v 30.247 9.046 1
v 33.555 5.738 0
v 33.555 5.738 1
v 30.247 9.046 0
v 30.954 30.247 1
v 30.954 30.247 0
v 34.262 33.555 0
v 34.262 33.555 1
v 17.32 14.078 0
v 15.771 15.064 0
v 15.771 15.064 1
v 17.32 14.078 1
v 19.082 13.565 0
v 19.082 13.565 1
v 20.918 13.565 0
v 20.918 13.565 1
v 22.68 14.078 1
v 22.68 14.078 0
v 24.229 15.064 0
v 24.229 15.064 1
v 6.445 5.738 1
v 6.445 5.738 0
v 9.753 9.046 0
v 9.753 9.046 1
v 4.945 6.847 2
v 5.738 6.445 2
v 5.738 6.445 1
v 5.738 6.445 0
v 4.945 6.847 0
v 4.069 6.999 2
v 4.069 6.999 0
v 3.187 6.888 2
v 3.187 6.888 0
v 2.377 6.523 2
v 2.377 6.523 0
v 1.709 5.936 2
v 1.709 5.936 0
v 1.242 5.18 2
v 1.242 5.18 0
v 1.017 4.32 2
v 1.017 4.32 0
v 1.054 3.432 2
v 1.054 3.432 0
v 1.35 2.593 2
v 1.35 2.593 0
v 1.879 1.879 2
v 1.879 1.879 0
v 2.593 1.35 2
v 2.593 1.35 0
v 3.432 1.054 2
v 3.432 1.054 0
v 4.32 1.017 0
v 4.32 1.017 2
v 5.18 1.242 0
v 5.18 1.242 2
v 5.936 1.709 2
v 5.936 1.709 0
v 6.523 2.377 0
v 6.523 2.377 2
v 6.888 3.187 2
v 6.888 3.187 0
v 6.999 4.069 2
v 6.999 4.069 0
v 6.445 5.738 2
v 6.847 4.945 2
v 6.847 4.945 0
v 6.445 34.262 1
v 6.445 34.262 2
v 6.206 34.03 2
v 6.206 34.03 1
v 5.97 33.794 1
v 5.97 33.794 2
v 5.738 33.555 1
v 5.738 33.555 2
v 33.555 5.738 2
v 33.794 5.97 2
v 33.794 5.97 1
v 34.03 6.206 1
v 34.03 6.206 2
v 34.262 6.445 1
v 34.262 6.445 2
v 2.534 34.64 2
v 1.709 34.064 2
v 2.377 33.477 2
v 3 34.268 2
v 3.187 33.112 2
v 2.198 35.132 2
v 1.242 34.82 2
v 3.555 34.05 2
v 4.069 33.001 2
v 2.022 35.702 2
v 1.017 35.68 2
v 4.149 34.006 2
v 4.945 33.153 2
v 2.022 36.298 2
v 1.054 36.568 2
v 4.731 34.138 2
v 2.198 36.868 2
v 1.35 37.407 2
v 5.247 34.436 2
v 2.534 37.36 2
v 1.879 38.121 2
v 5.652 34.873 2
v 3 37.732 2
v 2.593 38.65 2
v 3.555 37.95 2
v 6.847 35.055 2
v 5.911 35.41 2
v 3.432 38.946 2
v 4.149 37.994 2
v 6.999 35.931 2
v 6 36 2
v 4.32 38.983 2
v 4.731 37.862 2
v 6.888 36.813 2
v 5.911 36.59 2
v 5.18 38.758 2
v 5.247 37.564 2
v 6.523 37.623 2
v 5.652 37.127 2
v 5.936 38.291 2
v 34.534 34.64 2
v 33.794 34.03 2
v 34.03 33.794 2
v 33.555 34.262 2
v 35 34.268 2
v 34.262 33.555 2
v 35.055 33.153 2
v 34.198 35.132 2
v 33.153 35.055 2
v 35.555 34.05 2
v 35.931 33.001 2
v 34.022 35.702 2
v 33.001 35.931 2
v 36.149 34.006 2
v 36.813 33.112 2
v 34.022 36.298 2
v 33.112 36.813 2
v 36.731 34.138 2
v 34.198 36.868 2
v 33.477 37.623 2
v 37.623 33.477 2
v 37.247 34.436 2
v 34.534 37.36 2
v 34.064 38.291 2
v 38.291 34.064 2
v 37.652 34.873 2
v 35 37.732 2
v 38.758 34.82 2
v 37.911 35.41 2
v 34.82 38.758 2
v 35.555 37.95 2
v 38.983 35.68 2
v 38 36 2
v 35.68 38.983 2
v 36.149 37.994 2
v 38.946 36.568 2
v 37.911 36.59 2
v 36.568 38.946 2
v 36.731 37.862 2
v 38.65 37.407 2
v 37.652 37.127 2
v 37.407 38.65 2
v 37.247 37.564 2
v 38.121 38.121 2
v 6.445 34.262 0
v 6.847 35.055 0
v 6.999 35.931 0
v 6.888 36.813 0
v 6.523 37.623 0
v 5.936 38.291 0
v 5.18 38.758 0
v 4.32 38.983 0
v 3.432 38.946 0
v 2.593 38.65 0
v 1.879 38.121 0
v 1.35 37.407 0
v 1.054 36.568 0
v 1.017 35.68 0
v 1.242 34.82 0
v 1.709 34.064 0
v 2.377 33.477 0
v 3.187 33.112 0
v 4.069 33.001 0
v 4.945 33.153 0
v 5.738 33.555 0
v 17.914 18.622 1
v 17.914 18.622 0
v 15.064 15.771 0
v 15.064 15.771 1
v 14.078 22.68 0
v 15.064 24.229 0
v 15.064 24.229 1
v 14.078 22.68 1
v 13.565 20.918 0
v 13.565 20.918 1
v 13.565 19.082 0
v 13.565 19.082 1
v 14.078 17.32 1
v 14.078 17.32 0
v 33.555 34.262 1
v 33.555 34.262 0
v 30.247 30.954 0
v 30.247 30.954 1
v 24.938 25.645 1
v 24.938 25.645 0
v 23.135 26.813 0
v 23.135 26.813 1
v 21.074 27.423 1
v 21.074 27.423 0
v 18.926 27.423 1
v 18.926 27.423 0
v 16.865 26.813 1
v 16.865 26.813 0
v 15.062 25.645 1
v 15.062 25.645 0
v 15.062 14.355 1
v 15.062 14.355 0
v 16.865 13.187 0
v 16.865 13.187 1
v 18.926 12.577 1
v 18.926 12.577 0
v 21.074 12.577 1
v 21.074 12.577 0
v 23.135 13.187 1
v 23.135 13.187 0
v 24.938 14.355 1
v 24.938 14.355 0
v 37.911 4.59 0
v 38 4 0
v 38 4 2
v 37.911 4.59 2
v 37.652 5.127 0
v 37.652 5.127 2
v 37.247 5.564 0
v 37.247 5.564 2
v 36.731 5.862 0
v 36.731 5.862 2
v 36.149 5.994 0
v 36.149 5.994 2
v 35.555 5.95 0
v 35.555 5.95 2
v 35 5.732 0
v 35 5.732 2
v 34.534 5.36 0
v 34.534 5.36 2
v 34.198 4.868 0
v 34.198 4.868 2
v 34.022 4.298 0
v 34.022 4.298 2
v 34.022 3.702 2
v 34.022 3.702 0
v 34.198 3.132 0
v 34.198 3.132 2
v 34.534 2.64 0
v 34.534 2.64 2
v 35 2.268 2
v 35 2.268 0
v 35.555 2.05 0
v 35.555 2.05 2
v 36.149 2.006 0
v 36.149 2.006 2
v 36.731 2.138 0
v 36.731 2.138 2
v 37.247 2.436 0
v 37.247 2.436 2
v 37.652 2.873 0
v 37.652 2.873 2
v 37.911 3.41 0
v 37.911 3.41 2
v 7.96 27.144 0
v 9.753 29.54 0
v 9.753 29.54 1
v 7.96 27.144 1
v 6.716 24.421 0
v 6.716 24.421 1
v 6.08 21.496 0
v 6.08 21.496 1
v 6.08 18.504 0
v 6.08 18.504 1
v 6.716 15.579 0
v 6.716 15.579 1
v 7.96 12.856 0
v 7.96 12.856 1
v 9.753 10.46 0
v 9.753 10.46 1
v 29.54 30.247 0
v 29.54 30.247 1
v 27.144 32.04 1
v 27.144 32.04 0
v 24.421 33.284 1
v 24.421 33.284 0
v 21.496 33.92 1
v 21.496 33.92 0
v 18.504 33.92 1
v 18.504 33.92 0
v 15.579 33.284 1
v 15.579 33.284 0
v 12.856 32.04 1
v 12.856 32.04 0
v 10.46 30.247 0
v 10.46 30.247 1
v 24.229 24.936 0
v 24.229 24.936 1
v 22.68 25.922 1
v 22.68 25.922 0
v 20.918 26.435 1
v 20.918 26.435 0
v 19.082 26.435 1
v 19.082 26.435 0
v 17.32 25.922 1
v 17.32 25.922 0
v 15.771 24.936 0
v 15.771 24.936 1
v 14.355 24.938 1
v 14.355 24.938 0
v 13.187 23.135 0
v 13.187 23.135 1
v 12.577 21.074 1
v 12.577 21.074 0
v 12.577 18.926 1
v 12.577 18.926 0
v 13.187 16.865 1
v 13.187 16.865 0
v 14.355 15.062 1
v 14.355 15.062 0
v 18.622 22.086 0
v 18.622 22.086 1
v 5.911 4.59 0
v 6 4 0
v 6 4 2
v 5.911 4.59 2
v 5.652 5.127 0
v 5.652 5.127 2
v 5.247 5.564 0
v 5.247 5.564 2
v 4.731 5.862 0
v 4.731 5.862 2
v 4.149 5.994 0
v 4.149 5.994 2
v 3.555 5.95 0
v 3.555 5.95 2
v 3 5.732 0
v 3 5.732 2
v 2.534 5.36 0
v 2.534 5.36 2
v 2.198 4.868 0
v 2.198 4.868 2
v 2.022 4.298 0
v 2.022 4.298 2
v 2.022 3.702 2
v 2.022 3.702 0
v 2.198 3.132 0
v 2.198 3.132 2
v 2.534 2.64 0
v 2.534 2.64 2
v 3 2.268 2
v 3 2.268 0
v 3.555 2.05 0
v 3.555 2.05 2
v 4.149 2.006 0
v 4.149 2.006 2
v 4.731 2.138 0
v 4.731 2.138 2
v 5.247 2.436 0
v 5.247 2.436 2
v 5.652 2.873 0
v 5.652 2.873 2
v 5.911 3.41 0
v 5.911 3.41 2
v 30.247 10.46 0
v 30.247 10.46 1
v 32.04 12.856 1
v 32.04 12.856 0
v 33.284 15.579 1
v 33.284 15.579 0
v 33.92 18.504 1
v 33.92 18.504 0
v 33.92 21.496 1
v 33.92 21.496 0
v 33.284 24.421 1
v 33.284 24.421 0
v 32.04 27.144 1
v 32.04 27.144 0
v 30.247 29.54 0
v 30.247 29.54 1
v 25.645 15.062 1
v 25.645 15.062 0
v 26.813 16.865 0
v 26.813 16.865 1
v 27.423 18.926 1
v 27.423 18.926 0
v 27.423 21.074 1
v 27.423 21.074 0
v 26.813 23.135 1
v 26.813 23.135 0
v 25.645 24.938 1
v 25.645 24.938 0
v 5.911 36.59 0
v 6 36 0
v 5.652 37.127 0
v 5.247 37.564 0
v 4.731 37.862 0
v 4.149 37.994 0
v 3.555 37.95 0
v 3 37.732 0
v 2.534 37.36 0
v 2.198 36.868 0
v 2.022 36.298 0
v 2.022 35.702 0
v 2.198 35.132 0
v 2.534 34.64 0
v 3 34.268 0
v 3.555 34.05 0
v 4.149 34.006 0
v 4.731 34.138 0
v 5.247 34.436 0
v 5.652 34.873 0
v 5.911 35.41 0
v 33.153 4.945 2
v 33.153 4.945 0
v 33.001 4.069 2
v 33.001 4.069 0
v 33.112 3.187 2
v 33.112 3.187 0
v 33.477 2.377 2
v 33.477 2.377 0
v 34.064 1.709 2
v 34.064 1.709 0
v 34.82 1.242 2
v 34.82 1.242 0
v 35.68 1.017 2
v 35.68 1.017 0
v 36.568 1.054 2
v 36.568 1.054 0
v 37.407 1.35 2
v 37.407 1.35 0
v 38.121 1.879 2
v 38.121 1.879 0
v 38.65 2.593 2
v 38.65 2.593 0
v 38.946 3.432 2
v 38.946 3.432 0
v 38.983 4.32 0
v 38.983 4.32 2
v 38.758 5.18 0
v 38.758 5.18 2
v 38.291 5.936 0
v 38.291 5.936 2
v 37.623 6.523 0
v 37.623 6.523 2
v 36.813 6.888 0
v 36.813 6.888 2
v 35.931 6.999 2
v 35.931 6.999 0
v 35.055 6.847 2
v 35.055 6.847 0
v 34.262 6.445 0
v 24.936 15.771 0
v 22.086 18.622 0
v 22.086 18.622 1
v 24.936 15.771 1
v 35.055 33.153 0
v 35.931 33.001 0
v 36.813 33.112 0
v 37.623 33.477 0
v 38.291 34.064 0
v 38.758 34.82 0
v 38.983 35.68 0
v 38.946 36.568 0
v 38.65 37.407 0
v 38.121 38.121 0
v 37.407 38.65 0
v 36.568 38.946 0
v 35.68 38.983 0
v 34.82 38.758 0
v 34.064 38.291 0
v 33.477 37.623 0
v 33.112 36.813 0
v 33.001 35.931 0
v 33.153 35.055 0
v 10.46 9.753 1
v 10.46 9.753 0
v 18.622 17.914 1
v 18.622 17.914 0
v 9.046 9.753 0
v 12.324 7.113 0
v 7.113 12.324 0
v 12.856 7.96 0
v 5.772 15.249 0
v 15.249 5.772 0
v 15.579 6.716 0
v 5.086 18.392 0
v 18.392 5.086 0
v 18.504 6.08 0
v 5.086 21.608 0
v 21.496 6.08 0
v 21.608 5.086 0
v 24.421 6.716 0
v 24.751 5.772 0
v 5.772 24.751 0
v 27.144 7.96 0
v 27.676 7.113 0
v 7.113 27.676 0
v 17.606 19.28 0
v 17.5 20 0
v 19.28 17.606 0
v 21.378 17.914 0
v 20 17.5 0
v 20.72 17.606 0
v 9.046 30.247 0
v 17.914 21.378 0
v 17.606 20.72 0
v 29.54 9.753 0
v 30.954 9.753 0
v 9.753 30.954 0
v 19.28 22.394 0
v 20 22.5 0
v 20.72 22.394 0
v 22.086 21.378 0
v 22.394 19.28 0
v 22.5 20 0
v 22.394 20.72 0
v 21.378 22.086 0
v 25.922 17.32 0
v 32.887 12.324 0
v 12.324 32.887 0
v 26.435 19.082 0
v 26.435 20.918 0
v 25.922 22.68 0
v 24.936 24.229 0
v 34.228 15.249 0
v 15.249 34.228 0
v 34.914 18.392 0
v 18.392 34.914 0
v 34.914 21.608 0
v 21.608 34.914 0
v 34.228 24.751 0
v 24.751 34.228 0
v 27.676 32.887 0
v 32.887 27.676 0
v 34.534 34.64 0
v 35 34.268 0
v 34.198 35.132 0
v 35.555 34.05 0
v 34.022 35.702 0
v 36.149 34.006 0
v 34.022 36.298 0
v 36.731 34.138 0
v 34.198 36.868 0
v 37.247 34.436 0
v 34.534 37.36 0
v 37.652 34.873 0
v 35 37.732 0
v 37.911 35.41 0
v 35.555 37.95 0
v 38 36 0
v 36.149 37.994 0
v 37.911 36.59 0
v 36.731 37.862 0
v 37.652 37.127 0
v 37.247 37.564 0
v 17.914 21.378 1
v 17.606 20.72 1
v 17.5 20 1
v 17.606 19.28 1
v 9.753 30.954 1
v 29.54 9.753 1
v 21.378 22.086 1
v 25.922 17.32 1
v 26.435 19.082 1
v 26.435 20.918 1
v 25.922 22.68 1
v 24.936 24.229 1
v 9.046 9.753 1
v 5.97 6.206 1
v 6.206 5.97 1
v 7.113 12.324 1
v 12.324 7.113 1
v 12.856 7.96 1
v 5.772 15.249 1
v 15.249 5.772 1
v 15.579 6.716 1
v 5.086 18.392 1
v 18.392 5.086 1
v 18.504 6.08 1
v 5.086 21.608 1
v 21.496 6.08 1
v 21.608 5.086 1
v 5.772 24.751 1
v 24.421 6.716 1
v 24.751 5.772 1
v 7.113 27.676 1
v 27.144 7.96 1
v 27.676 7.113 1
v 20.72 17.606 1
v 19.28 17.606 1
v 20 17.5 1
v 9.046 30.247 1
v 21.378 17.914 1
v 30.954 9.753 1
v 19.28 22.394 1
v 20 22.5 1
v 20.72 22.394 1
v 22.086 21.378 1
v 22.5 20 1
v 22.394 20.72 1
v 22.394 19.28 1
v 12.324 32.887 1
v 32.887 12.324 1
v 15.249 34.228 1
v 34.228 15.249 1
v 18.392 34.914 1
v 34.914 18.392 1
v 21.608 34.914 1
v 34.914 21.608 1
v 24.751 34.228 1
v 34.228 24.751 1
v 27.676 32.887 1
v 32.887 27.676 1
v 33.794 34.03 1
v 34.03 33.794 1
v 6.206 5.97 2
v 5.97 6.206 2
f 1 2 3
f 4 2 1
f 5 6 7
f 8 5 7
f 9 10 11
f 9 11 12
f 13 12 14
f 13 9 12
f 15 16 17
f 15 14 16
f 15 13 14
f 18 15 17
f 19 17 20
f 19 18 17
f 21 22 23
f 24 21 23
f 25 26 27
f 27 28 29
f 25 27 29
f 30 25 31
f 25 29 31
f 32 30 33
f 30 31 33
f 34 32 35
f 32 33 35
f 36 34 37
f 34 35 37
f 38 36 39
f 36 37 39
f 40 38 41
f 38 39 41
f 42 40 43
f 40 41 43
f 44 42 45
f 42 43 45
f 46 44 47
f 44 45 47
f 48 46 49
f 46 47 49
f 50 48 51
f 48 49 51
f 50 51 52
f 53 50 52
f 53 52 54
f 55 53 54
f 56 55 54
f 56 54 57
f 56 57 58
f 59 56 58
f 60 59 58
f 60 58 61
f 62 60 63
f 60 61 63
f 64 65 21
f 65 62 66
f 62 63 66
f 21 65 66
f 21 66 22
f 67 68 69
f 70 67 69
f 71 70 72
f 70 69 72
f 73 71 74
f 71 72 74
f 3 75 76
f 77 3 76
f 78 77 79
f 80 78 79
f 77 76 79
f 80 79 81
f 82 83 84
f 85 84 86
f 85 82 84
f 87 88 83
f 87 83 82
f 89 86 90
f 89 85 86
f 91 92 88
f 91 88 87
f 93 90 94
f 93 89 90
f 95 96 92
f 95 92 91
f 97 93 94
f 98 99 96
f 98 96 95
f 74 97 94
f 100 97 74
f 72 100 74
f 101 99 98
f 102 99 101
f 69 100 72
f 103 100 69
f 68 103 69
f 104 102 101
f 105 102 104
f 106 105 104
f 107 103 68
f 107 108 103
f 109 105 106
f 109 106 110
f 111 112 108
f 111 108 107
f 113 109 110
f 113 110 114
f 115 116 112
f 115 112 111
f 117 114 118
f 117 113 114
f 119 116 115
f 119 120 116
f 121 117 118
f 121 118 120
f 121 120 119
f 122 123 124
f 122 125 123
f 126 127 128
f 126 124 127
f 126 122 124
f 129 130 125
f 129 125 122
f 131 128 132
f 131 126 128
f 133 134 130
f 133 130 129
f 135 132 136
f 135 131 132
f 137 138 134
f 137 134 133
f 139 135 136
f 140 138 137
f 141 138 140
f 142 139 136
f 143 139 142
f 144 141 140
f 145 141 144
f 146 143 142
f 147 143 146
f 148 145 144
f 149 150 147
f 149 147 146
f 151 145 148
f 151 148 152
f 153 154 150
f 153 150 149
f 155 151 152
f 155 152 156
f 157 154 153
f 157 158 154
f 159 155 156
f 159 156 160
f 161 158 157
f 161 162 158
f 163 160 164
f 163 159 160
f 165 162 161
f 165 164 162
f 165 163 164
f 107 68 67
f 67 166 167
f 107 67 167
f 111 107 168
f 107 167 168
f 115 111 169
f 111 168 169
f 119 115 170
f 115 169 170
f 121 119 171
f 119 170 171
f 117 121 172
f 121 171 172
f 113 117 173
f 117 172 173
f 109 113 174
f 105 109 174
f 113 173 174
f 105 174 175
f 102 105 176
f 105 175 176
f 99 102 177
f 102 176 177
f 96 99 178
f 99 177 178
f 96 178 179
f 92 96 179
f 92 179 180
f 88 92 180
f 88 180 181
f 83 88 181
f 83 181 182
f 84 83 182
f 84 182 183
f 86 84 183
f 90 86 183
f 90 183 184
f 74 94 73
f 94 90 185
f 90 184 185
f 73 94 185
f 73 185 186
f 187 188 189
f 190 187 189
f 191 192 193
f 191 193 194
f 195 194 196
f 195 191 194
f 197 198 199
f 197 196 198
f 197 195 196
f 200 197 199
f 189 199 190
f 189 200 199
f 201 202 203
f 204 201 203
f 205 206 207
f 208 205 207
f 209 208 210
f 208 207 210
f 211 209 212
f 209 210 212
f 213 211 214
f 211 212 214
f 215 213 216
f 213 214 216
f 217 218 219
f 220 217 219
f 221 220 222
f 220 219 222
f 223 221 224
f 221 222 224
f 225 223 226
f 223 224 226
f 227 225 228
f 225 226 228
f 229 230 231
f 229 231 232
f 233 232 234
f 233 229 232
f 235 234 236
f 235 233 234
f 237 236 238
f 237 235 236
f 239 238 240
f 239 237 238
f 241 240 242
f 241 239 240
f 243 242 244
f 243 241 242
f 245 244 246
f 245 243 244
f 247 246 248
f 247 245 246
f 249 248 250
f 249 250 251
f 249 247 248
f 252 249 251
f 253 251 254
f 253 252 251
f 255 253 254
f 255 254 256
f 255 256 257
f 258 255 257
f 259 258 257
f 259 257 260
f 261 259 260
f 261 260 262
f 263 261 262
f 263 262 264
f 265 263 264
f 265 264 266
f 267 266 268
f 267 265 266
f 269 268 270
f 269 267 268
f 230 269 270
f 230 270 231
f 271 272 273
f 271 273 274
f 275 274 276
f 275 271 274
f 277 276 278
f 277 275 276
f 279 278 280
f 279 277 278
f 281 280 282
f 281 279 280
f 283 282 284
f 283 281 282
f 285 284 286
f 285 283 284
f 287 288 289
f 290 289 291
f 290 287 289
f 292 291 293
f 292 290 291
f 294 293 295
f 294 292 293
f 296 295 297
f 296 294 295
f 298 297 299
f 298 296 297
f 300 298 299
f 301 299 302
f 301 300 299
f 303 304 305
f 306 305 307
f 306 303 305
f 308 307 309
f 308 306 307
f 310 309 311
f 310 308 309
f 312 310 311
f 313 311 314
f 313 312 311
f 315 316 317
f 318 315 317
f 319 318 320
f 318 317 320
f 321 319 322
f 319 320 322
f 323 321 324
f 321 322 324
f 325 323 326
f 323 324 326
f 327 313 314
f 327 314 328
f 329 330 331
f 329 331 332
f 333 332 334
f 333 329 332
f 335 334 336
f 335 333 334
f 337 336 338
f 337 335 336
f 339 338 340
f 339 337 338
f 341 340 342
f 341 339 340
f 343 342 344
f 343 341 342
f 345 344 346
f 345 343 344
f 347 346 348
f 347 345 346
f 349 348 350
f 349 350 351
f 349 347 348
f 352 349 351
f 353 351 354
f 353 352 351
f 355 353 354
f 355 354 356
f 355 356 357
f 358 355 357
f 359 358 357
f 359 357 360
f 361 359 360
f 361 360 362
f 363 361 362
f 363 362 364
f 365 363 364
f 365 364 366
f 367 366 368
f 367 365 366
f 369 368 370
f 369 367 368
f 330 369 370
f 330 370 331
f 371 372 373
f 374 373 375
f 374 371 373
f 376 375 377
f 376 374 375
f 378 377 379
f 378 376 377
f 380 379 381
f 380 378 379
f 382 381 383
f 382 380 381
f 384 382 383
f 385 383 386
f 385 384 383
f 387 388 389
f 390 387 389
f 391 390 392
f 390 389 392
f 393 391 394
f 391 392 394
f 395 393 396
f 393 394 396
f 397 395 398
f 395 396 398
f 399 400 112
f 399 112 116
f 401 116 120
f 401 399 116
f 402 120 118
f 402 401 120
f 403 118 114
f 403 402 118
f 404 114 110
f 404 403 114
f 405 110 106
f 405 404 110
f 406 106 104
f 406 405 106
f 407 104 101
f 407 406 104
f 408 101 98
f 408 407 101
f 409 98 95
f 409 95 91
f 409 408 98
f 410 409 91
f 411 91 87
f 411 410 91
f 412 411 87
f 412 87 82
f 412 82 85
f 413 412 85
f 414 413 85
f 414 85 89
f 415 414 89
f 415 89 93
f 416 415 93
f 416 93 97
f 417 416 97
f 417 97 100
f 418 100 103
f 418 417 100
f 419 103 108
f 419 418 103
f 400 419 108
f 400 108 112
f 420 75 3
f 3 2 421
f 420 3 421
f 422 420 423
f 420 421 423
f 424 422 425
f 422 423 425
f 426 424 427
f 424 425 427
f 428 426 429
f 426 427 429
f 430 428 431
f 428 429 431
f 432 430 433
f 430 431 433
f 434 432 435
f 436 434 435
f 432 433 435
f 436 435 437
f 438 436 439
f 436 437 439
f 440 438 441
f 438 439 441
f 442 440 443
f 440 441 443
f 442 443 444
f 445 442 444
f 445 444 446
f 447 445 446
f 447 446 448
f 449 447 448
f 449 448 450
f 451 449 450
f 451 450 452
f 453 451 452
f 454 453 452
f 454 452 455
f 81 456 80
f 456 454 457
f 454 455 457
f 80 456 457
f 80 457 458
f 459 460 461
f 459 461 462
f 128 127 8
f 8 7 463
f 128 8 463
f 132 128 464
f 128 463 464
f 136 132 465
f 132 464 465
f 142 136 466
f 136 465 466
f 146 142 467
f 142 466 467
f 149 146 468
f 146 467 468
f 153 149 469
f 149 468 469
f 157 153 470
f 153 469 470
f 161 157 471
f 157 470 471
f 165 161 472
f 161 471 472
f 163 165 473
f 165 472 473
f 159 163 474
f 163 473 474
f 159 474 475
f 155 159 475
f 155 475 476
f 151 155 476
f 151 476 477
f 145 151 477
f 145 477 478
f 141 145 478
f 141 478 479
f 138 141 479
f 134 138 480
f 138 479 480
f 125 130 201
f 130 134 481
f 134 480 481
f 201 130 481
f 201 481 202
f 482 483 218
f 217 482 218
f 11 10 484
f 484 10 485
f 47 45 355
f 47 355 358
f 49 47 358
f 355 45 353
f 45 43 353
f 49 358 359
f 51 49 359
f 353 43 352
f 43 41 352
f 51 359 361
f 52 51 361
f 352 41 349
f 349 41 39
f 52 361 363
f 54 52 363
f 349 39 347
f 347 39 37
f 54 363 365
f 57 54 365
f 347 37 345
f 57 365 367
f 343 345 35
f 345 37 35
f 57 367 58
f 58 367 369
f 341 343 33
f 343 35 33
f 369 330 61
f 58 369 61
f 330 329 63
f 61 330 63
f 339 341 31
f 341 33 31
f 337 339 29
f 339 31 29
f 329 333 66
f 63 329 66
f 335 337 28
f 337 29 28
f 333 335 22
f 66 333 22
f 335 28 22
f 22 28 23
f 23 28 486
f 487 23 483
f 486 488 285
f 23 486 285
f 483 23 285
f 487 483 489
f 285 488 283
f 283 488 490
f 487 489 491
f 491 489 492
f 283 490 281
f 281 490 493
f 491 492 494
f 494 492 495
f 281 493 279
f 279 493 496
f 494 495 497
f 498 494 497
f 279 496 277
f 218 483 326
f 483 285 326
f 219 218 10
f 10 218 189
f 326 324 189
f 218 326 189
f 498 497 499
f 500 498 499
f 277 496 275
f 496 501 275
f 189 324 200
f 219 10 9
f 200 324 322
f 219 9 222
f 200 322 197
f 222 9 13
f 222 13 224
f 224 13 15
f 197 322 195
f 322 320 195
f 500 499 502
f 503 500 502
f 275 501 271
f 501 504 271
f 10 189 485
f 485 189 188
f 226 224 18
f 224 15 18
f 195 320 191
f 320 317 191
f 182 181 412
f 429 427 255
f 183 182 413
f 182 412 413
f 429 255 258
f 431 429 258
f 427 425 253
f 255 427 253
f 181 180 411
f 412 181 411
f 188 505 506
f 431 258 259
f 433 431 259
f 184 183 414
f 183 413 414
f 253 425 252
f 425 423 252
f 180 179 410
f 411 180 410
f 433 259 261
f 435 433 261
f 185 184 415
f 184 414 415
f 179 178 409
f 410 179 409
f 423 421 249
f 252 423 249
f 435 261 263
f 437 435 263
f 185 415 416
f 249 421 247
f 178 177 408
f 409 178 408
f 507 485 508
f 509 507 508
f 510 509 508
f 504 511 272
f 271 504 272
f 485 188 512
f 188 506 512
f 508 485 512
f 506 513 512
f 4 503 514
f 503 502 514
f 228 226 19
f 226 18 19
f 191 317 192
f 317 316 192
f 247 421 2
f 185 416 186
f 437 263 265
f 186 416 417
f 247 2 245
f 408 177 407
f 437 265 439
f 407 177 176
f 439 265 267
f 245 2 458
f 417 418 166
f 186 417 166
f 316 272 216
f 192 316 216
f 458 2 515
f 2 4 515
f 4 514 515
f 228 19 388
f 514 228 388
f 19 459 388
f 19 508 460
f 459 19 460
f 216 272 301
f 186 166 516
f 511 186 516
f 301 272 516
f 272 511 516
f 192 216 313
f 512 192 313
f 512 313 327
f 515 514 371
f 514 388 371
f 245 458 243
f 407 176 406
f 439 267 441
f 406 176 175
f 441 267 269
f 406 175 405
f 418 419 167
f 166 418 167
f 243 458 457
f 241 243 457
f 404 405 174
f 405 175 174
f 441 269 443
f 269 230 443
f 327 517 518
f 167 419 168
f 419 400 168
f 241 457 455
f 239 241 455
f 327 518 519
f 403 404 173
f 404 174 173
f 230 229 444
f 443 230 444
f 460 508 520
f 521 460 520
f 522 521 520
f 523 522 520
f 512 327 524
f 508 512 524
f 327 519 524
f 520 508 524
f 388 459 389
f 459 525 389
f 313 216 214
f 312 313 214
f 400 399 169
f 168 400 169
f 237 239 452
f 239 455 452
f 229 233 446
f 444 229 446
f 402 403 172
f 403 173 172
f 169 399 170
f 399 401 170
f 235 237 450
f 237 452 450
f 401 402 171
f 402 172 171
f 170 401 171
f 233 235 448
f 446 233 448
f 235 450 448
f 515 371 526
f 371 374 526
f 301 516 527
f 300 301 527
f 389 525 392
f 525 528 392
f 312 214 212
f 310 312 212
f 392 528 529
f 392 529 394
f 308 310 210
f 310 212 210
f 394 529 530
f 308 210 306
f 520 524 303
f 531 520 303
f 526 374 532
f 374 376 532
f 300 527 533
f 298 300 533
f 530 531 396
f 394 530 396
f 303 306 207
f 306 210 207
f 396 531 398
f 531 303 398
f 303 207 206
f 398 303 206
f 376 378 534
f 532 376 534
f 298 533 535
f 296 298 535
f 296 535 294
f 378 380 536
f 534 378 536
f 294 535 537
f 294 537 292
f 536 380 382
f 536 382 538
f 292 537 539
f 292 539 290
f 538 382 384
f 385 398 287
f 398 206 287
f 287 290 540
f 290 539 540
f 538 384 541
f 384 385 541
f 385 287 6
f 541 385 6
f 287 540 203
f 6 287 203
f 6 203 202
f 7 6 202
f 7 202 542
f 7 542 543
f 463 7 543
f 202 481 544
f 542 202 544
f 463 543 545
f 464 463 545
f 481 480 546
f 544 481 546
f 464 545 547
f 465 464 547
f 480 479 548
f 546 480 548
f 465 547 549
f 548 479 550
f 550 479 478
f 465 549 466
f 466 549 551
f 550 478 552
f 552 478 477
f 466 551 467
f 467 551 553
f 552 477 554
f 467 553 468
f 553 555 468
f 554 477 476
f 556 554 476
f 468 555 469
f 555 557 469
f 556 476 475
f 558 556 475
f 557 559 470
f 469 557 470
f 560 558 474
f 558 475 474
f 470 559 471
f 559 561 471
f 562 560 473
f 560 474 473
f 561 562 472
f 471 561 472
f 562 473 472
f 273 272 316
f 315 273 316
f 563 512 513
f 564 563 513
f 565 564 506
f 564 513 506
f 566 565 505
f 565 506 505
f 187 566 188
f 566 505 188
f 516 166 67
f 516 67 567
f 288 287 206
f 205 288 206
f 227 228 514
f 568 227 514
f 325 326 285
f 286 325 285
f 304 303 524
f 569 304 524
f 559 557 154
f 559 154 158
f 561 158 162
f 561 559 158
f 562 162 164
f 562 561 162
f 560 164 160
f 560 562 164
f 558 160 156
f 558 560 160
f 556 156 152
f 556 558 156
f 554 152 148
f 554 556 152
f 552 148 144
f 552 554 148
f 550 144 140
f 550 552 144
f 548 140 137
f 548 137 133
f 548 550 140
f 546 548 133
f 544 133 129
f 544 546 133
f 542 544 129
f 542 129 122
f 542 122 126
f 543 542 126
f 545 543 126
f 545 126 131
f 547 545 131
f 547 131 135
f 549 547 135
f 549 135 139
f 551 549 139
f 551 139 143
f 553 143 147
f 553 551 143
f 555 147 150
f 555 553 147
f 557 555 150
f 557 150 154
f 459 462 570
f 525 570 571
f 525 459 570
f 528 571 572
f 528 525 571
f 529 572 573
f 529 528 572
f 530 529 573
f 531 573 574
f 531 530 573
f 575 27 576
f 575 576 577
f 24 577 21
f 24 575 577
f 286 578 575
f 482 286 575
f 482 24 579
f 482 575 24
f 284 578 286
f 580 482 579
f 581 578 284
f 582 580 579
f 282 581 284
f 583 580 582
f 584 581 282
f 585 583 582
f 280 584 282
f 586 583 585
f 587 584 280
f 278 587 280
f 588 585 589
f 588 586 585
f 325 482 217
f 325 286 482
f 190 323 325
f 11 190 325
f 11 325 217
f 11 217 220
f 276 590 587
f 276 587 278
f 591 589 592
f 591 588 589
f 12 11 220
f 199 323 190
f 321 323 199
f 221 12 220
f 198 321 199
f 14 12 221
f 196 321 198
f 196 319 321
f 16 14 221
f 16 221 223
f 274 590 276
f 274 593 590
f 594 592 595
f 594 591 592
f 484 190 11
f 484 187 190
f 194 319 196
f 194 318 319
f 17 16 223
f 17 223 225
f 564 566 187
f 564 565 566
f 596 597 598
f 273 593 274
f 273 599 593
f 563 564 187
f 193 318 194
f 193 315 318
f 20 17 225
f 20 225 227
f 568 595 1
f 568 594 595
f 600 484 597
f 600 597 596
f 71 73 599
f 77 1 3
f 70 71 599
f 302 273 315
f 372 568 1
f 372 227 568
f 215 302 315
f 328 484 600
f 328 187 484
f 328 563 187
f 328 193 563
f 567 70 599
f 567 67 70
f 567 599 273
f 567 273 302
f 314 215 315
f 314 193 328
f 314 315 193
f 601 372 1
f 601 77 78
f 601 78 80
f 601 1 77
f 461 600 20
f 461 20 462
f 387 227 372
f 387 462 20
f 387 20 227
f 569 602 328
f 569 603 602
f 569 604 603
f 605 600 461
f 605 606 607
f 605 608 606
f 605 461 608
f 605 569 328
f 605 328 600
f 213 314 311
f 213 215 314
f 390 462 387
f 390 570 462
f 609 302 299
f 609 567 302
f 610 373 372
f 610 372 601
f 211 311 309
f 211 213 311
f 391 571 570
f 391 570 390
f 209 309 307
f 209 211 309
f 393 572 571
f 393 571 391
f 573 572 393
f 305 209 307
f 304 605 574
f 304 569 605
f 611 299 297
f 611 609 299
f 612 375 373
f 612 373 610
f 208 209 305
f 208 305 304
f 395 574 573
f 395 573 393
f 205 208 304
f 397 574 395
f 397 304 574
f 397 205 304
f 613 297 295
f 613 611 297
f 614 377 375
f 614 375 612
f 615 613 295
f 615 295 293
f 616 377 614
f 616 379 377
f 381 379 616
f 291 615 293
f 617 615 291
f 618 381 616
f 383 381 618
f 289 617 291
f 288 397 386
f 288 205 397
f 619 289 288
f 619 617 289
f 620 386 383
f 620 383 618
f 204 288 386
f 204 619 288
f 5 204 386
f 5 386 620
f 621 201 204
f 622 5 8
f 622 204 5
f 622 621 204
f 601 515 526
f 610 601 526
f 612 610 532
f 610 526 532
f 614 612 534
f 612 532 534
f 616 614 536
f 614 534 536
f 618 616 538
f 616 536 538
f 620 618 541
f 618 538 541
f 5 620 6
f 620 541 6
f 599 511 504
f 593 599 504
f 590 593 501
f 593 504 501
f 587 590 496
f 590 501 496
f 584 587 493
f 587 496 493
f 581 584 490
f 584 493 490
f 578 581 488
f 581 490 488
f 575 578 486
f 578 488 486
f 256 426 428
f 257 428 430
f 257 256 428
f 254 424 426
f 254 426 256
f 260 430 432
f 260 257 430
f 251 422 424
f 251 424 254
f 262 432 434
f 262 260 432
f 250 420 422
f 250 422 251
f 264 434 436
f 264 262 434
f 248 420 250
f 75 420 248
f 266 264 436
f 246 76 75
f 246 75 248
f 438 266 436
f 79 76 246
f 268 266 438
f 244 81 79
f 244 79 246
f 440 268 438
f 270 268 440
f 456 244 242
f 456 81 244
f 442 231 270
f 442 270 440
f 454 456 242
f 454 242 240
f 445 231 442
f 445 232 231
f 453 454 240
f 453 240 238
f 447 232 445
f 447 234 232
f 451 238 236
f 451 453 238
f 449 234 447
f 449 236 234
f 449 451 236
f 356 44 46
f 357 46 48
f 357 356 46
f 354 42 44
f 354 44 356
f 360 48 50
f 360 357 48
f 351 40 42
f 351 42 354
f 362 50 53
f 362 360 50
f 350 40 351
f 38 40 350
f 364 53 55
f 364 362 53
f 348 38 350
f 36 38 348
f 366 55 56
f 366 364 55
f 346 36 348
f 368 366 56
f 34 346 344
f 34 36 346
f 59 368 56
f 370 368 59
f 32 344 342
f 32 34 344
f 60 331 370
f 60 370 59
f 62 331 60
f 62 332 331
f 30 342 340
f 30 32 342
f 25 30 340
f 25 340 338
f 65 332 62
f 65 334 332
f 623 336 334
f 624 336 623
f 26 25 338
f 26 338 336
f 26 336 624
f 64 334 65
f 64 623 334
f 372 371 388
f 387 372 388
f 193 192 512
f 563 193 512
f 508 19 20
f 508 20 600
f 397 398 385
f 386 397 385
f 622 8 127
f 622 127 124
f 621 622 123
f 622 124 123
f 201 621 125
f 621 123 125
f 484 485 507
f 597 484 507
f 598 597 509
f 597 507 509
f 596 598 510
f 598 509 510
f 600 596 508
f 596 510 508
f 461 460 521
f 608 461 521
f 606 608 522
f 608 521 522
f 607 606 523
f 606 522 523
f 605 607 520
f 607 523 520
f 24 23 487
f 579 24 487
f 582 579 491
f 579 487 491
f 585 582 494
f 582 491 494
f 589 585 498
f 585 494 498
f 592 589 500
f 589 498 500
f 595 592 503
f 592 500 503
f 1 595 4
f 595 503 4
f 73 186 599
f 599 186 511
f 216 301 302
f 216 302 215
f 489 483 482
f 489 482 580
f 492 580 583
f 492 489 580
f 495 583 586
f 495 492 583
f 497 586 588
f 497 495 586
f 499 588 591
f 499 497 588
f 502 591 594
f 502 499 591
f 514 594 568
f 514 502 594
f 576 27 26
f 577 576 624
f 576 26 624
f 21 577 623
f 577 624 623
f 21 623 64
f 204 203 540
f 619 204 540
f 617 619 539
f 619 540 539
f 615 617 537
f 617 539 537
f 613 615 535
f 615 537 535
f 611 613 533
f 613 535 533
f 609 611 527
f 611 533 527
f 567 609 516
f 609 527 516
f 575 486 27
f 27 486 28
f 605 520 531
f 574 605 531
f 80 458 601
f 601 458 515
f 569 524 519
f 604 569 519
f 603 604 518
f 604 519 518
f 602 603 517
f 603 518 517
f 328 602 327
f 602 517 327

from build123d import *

# Parameters (mm, degrees)
SKETCH_R     = 2
PAD_DEPTH    = 2
SKETCH001_R  = 19.675731
POCKET_DEPTH = 1


with BuildPart() as part:
    # Sketch → Pad (new body)
    with BuildSketch(Plane.XY):
        with BuildLine():
            ThreePointArc((6.445203, 34.261903), (1.87868, 38.12132), (5.738097, 33.554797))
            Line((5.738097, 33.554797), (9.045739, 30.247154))
            ThreePointArc((9.045739, 30.247154), (5, 20), (9.045739, 9.752846))
            Line((9.045739, 9.752846), (5.738097, 6.445203))
            ThreePointArc((5.738097, 6.445203), (1.87868, 1.87868), (6.445203, 5.738097))
            Line((6.445203, 5.738097), (9.752846, 9.045739))
            ThreePointArc((9.752846, 9.045739), (20, 5), (30.247154, 9.045739))
            Line((33.554797, 5.738097), (30.247154, 9.045739))
            ThreePointArc((33.554797, 5.738097), (38.12132, 1.87868), (34.261903, 6.445203))
            Line((34.261903, 6.445203), (30.954261, 9.752846))
            ThreePointArc((30.954261, 9.752846), (35, 20), (30.954261, 30.247154))
            Line((30.954261, 30.247154), (34.261903, 33.554797))
            ThreePointArc((34.261903, 33.554797), (38.12132, 38.12132), (33.554797, 34.261903))
            Line((33.554797, 34.261903), (30.247154, 30.954261))
            ThreePointArc((30.247154, 30.954261), (20, 35), (9.752846, 30.954261))
            Line((6.445203, 34.261903), (9.752846, 30.954261))
        make_face()
        with Locations((4, 36)):
            Circle(SKETCH_R, mode=Mode.SUBTRACT)
        with Locations((36, 36)):
            Circle(SKETCH_R, mode=Mode.SUBTRACT)
        with Locations((4, 4)):
            Circle(SKETCH_R, mode=Mode.SUBTRACT)
        with Locations((36, 4)):
            Circle(SKETCH_R, mode=Mode.SUBTRACT)
        with BuildLine():
            ThreePointArc((30.246733, 10.460374), (34, 20), (30.246733, 29.539626))
            Line((25.645056, 24.937949), (30.246733, 29.539626))
            ThreePointArc((25.645056, 15.062051), (27.5, 20), (25.645056, 24.937949))
            Line((30.246733, 10.460374), (25.645056, 15.062051))
        make_face(mode=Mode.SUBTRACT)
        with BuildLine():
            ThreePointArc((14.354944, 24.937949), (12.5, 20), (14.354944, 15.062051))
            Line((14.354944, 15.062051), (9.753267, 10.460374))
            ThreePointArc((9.753267, 29.539626), (6, 20), (9.753267, 10.460374))
            Line((9.753267, 29.539626), (14.354944, 24.937949))
        make_face(mode=Mode.SUBTRACT)
        with BuildLine():
            ThreePointArc((24.936129, 15.770978), (26.5, 20), (24.936129, 24.229022))
            Line((22.085604, 21.378497), (24.936129, 24.229022))
            ThreePointArc((22.085604, 18.621503), (22.5, 20), (22.085604, 21.378497))
            Line((22.085604, 18.621503), (24.936129, 15.770978))
        make_face(mode=Mode.SUBTRACT)
        with BuildLine():
            ThreePointArc((17.914396, 21.378497), (17.5, 20), (17.914396, 18.621503))
            Line((17.914396, 18.621503), (15.063871, 15.770978))
            ThreePointArc((15.063871, 24.229022), (13.5, 20), (15.063871, 15.770978))
            Line((15.063871, 24.229022), (17.914396, 21.378497))
        make_face(mode=Mode.SUBTRACT)
        with BuildLine():
            Line((10.460374, 30.246733), (15.062051, 25.645056))
            ThreePointArc((24.937949, 25.645056), (20, 27.5), (15.062051, 25.645056))
            Line((29.539626, 30.246733), (24.937949, 25.645056))
            ThreePointArc((29.539626, 30.246733), (20, 34), (10.460374, 30.246733))
        make_face(mode=Mode.SUBTRACT)
        with BuildLine():
            Line((15.770978, 24.936129), (18.621503, 22.085604))
            ThreePointArc((21.378497, 22.085604), (20, 22.5), (18.621503, 22.085604))
            Line((24.229022, 24.936129), (21.378497, 22.085604))
            ThreePointArc((24.229022, 24.936129), (20, 26.5), (15.770978, 24.936129))
        make_face(mode=Mode.SUBTRACT)
        with BuildLine():
            Line((24.937949, 14.354944), (29.539626, 9.753267))
            ThreePointArc((10.460374, 9.753267), (20, 6), (29.539626, 9.753267))
            Line((10.460374, 9.753267), (15.062051, 14.354944))
            ThreePointArc((15.062051, 14.354944), (20, 12.5), (24.937949, 14.354944))
        make_face(mode=Mode.SUBTRACT)
        with BuildLine():
            Line((24.229022, 15.063871), (21.378497, 17.914396))
            ThreePointArc((18.621503, 17.914396), (20, 17.5), (21.378497, 17.914396))
            Line((15.770978, 15.063871), (18.621503, 17.914396))
            ThreePointArc((15.770978, 15.063871), (20, 13.5), (24.229022, 15.063871))
        make_face(mode=Mode.SUBTRACT)
    extrude(amount=PAD_DEPTH)

    # Sketch001 (on Face54 of Pad) → Pocket (cut)
    with BuildSketch(Plane.XY.offset(2)):
        with Locations((20, 20)):
            Circle(SKETCH001_R)
    extrude(amount=-POCKET_DEPTH, mode=Mode.SUBTRACT)


solid = part.part
